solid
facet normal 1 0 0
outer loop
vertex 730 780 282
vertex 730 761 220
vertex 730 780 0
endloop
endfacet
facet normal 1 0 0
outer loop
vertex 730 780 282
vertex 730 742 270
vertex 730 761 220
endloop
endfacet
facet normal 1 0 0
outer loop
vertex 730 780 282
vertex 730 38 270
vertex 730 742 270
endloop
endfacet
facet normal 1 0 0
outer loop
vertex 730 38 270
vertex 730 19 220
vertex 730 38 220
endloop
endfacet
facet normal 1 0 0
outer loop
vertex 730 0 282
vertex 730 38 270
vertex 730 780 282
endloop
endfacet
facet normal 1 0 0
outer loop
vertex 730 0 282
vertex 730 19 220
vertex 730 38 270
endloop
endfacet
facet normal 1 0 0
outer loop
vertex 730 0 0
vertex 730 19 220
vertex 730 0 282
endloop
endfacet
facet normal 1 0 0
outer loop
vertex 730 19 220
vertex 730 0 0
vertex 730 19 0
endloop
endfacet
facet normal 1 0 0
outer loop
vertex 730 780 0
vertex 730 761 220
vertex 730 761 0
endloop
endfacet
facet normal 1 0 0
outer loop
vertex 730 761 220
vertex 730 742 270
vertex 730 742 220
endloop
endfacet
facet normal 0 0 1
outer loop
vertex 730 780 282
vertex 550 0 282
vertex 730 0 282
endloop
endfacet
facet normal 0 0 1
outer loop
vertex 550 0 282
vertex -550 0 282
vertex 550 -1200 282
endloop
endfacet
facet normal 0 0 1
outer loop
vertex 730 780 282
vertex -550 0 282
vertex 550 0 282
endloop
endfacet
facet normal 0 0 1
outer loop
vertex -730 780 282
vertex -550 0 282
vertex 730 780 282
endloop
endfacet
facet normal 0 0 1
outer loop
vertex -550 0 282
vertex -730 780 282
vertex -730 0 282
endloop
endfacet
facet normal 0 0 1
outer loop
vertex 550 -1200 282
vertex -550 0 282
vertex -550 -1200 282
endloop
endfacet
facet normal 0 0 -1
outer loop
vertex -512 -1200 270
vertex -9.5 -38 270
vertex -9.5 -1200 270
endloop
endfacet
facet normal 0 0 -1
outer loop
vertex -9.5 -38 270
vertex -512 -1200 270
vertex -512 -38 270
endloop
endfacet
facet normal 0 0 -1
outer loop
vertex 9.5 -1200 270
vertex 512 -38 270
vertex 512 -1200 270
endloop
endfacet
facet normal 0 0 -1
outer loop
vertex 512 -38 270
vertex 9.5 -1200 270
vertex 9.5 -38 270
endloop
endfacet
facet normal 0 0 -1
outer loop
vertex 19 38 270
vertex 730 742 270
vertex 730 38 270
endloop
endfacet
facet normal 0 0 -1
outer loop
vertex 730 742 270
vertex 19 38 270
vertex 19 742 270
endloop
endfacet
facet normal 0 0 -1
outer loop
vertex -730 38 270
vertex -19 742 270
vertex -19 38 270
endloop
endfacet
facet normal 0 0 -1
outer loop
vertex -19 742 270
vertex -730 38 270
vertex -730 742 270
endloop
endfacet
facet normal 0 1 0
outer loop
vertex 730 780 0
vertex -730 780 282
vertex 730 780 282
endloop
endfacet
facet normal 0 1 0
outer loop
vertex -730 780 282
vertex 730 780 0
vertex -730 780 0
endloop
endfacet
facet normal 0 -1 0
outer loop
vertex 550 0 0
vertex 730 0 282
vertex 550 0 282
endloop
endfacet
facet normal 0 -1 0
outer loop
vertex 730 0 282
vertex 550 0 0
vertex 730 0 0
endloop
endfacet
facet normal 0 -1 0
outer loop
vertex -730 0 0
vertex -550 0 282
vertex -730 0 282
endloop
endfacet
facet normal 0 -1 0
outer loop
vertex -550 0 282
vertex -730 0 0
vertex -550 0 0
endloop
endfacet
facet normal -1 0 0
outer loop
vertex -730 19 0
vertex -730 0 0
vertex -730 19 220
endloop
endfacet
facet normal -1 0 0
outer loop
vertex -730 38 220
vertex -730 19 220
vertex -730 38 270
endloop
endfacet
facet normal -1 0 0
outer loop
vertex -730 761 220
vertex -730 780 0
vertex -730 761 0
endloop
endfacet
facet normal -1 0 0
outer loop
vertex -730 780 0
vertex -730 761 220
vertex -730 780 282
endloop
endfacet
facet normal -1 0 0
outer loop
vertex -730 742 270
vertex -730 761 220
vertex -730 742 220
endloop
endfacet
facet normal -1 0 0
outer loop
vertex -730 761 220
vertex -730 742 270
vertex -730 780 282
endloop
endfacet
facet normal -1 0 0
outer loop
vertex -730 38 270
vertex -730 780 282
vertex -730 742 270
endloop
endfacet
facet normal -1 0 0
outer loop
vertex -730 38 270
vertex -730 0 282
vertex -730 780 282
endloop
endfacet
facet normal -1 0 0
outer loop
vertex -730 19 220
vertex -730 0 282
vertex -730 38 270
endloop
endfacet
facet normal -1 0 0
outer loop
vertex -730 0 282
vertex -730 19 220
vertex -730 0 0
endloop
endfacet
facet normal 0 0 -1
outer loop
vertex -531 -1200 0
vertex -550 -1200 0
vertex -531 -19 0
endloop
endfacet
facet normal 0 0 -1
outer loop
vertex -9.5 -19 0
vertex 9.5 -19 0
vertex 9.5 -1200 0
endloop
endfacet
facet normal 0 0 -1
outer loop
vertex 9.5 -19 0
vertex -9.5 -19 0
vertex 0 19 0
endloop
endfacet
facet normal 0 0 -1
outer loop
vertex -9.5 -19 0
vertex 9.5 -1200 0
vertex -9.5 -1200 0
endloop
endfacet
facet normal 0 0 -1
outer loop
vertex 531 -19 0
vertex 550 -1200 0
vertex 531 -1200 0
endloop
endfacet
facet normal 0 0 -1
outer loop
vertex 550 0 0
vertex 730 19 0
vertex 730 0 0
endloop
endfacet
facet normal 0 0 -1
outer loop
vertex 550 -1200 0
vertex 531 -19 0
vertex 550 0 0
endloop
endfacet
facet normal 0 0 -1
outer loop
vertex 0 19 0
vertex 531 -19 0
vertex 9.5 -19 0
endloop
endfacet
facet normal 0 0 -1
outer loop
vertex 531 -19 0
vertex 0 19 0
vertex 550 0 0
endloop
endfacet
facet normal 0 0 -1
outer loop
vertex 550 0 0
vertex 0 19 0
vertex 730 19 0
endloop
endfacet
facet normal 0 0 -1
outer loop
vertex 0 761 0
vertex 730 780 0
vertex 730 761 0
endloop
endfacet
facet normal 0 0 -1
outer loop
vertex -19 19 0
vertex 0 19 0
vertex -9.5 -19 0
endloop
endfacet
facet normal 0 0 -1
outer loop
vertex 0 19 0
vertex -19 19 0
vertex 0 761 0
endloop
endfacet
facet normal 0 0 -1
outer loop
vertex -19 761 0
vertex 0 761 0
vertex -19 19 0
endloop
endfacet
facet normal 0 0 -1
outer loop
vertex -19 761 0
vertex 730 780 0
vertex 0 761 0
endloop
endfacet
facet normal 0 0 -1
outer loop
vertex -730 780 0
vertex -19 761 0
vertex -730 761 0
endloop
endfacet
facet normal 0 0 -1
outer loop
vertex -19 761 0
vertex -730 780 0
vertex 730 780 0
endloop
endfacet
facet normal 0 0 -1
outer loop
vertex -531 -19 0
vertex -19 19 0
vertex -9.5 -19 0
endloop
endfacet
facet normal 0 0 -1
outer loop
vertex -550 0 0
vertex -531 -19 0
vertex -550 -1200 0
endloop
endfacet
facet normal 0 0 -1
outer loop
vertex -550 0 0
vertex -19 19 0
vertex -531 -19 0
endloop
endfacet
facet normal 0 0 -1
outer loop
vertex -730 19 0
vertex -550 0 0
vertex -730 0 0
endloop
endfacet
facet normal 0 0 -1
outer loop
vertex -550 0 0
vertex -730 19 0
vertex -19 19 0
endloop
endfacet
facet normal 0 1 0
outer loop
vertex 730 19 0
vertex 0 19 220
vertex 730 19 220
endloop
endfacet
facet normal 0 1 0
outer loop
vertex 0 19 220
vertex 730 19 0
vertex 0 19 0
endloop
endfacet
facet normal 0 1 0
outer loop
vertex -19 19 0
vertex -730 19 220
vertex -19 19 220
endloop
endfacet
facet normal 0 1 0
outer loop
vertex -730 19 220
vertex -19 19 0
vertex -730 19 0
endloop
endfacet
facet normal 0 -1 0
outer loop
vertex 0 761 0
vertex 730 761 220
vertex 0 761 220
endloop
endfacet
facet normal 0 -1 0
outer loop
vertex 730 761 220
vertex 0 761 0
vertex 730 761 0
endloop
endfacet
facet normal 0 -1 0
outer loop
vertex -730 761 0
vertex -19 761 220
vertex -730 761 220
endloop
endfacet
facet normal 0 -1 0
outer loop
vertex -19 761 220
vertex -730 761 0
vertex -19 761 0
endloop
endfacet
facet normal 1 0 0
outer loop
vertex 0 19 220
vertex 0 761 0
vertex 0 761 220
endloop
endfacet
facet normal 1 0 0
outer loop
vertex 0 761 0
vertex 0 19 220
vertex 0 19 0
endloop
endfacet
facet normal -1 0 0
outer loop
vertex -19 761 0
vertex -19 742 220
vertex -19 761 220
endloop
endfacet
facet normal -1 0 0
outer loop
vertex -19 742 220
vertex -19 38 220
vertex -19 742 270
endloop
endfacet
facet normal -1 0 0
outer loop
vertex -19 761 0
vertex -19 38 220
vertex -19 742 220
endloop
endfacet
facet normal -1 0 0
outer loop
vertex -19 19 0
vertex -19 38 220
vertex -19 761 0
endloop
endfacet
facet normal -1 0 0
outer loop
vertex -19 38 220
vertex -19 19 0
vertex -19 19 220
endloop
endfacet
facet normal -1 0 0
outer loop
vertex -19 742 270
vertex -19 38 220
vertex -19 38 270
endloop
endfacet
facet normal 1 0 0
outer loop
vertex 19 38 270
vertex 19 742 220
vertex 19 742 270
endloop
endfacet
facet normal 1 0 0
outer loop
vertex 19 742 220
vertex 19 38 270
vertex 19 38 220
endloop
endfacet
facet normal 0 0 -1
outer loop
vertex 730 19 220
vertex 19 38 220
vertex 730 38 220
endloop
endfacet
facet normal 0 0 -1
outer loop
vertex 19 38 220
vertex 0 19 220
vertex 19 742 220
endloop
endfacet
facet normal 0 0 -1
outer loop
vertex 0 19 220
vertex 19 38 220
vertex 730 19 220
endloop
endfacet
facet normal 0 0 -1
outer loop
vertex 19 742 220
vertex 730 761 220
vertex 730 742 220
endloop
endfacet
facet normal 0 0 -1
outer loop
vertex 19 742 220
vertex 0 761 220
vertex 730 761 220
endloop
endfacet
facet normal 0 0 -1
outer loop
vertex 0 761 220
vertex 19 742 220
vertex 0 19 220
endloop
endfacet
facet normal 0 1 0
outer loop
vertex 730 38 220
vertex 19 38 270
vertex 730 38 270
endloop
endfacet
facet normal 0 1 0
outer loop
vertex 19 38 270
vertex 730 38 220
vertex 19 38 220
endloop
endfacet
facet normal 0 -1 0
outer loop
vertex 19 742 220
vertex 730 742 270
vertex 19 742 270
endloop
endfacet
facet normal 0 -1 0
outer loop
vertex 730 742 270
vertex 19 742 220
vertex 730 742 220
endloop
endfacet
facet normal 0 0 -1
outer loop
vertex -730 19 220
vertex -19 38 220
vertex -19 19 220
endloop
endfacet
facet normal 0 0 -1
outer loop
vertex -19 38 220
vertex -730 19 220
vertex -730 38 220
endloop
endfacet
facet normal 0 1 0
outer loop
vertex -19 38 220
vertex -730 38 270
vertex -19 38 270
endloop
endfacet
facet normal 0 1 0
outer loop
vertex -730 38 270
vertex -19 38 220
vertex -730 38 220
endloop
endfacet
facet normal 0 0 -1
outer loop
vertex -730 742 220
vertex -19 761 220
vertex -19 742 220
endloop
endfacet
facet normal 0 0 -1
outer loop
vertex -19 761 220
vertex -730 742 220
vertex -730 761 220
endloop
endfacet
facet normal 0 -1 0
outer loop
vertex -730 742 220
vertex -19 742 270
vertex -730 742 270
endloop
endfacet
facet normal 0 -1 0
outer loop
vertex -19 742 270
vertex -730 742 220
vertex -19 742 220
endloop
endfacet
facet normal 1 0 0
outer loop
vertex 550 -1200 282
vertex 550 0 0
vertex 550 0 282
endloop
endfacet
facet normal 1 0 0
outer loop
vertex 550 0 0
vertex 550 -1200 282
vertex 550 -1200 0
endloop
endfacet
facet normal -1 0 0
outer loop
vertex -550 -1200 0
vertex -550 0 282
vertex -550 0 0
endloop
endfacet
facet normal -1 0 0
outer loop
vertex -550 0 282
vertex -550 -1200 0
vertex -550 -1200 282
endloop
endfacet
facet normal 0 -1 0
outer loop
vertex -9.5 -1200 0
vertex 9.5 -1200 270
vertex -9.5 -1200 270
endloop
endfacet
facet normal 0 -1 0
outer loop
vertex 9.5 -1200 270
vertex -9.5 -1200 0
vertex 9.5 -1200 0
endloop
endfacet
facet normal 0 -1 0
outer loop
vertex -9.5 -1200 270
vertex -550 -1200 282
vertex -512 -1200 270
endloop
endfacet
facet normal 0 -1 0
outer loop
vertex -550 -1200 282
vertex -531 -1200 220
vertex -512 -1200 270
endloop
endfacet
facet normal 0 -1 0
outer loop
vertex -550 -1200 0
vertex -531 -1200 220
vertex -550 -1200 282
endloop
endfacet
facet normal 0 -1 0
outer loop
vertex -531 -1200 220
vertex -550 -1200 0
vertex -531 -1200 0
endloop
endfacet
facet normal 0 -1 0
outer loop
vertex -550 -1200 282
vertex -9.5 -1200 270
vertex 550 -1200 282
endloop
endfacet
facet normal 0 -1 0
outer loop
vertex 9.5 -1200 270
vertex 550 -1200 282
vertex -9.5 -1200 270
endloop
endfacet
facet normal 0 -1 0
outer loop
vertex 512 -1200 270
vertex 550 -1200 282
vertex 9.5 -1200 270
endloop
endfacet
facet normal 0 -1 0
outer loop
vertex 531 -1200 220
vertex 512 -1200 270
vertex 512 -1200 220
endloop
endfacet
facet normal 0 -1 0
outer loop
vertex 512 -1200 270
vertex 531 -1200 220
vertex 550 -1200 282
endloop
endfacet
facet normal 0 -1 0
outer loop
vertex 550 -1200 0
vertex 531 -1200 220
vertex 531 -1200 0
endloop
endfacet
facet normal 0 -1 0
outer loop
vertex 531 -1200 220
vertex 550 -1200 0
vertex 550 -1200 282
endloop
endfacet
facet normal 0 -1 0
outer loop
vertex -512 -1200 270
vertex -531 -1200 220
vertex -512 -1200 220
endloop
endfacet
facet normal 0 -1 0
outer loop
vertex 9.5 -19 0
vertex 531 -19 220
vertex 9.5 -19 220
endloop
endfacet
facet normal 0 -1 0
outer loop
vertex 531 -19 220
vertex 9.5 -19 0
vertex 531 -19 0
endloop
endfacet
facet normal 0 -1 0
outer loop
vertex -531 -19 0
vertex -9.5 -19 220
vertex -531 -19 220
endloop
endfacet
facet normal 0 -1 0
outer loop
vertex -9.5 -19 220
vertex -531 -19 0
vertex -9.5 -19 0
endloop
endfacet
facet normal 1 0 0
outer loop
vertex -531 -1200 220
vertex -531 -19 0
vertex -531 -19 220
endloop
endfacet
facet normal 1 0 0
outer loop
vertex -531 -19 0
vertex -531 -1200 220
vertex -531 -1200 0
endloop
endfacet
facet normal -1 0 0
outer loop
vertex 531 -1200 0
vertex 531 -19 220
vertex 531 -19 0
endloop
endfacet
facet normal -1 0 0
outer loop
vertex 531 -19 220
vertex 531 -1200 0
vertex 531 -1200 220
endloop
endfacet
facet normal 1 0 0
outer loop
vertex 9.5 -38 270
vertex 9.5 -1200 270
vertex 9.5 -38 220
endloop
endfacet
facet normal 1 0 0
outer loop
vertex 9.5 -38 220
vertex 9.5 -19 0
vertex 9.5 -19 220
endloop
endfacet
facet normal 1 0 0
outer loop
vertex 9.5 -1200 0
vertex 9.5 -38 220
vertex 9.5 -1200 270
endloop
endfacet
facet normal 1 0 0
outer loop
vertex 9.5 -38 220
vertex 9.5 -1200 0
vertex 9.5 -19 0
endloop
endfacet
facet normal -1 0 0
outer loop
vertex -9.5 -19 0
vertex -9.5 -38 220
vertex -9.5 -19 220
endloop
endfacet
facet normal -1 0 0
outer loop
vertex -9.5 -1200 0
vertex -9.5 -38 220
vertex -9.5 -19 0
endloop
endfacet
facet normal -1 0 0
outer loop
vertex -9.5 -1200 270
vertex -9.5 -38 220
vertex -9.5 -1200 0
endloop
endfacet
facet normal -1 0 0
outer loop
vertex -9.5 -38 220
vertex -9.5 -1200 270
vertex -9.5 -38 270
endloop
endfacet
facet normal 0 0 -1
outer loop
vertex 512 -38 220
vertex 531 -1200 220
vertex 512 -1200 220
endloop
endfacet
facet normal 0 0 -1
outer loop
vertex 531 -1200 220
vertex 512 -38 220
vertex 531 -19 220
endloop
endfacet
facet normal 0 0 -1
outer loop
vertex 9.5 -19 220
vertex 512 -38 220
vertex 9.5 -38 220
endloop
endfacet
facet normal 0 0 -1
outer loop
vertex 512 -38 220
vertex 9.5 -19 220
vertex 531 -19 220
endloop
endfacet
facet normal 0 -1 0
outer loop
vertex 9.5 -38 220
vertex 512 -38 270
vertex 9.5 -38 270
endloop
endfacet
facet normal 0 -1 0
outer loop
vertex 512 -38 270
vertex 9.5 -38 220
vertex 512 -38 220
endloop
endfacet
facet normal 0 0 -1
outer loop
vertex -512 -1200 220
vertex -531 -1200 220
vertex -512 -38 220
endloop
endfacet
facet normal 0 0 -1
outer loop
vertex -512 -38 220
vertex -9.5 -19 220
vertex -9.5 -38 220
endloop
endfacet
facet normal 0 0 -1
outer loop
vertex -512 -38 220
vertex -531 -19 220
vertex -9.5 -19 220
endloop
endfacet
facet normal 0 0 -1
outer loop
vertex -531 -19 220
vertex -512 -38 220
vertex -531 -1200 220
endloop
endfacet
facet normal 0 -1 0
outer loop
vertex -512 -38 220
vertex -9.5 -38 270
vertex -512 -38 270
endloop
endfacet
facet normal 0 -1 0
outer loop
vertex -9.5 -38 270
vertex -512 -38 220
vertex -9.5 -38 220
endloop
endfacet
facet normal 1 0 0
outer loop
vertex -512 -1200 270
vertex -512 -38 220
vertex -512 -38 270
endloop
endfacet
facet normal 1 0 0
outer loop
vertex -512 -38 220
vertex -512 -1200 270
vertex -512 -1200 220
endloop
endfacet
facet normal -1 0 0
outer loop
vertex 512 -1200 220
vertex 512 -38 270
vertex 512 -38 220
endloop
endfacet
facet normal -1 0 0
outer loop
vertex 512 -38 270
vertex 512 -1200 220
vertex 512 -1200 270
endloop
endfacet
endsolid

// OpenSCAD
t = 19; //Thickness
t2 = 12; //Thickness ground
h = 270;

w1 = 1460;
w2 = 1100;

l1 = 780;
l2 = 1200;

l = l1+l2;

v = 50; //verstärkung

bOffset = 0;
bOffset = h+t;

//### Part 1

//Boden
color("green")
translate([0,0,-t+bOffset])
	cube([w1/2,l1,t2]);

color("darkblue")
translate([-w1/2,0,-t+bOffset])
	cube([w1/2,l1,t2]);

//Brett vorne
color("orange")
translate([-w1/2,0,0])
	cube([w1,t,h]);
//Brett hinten
translate([-w1/2,l1-t,0])
	cube([w1,t,h]);

//Brett mitte
translate([-t,t,0])
cube([t, l1-t*2, h]);

//Brett mitte, oben
color("brown")
translate([0,t,h-v])
cube([t, l1-t*2, v]);

color("brown")
translate([t,t,h-v])
cube([w1/2-t, t, v]);

color("brown")
translate([t,l1-t*2,h-v])
cube([w1/2-t, t, v]);

color("brown")
translate([-w1/2,t,h-v])
cube([w1/2-t, t, v]);

color("brown")
translate([-w1/2,l1-t*2,h-v])
cube([w1/2-t, t, v]);

//### Part 2

color("green")
translate([-w2/2,-l2,-t+bOffset])
	cube([w2, l2/2, t2]);
color("blue")
translate([-w2/2,-l2/2,-t+bOffset])
	cube([w2, l2/2, t2]);

//Hinten
translate([-w2/2,-t,0])
	cube([w2, t, h]);

//Links
translate([-w2/2,-l2,0])
	cube([t, l2-t, h]);

//Rechts
translate([w2/2-t,-l2,0])
	cube([t, l2-t, h]);

//Mitte
translate([-t/2,-l2,0])
	cube([t, l2-t, h]);

color("brown")
translate([t/2,-t*2,h-v])
cube([w2/2-(t+t/2), t, v]);

color("brown")
translate([-w2/2+t,-t*2,h-v])
cube([w2/2-(t+t/2), t, v]);

color("brown")
translate([-w2/2+t,-l2,h-v])
cube([t, l2-t*2, v]);

color("brown")
translate([w2/2-t*2,-l2,h-v])
cube([t, l2-t*2, v]);
